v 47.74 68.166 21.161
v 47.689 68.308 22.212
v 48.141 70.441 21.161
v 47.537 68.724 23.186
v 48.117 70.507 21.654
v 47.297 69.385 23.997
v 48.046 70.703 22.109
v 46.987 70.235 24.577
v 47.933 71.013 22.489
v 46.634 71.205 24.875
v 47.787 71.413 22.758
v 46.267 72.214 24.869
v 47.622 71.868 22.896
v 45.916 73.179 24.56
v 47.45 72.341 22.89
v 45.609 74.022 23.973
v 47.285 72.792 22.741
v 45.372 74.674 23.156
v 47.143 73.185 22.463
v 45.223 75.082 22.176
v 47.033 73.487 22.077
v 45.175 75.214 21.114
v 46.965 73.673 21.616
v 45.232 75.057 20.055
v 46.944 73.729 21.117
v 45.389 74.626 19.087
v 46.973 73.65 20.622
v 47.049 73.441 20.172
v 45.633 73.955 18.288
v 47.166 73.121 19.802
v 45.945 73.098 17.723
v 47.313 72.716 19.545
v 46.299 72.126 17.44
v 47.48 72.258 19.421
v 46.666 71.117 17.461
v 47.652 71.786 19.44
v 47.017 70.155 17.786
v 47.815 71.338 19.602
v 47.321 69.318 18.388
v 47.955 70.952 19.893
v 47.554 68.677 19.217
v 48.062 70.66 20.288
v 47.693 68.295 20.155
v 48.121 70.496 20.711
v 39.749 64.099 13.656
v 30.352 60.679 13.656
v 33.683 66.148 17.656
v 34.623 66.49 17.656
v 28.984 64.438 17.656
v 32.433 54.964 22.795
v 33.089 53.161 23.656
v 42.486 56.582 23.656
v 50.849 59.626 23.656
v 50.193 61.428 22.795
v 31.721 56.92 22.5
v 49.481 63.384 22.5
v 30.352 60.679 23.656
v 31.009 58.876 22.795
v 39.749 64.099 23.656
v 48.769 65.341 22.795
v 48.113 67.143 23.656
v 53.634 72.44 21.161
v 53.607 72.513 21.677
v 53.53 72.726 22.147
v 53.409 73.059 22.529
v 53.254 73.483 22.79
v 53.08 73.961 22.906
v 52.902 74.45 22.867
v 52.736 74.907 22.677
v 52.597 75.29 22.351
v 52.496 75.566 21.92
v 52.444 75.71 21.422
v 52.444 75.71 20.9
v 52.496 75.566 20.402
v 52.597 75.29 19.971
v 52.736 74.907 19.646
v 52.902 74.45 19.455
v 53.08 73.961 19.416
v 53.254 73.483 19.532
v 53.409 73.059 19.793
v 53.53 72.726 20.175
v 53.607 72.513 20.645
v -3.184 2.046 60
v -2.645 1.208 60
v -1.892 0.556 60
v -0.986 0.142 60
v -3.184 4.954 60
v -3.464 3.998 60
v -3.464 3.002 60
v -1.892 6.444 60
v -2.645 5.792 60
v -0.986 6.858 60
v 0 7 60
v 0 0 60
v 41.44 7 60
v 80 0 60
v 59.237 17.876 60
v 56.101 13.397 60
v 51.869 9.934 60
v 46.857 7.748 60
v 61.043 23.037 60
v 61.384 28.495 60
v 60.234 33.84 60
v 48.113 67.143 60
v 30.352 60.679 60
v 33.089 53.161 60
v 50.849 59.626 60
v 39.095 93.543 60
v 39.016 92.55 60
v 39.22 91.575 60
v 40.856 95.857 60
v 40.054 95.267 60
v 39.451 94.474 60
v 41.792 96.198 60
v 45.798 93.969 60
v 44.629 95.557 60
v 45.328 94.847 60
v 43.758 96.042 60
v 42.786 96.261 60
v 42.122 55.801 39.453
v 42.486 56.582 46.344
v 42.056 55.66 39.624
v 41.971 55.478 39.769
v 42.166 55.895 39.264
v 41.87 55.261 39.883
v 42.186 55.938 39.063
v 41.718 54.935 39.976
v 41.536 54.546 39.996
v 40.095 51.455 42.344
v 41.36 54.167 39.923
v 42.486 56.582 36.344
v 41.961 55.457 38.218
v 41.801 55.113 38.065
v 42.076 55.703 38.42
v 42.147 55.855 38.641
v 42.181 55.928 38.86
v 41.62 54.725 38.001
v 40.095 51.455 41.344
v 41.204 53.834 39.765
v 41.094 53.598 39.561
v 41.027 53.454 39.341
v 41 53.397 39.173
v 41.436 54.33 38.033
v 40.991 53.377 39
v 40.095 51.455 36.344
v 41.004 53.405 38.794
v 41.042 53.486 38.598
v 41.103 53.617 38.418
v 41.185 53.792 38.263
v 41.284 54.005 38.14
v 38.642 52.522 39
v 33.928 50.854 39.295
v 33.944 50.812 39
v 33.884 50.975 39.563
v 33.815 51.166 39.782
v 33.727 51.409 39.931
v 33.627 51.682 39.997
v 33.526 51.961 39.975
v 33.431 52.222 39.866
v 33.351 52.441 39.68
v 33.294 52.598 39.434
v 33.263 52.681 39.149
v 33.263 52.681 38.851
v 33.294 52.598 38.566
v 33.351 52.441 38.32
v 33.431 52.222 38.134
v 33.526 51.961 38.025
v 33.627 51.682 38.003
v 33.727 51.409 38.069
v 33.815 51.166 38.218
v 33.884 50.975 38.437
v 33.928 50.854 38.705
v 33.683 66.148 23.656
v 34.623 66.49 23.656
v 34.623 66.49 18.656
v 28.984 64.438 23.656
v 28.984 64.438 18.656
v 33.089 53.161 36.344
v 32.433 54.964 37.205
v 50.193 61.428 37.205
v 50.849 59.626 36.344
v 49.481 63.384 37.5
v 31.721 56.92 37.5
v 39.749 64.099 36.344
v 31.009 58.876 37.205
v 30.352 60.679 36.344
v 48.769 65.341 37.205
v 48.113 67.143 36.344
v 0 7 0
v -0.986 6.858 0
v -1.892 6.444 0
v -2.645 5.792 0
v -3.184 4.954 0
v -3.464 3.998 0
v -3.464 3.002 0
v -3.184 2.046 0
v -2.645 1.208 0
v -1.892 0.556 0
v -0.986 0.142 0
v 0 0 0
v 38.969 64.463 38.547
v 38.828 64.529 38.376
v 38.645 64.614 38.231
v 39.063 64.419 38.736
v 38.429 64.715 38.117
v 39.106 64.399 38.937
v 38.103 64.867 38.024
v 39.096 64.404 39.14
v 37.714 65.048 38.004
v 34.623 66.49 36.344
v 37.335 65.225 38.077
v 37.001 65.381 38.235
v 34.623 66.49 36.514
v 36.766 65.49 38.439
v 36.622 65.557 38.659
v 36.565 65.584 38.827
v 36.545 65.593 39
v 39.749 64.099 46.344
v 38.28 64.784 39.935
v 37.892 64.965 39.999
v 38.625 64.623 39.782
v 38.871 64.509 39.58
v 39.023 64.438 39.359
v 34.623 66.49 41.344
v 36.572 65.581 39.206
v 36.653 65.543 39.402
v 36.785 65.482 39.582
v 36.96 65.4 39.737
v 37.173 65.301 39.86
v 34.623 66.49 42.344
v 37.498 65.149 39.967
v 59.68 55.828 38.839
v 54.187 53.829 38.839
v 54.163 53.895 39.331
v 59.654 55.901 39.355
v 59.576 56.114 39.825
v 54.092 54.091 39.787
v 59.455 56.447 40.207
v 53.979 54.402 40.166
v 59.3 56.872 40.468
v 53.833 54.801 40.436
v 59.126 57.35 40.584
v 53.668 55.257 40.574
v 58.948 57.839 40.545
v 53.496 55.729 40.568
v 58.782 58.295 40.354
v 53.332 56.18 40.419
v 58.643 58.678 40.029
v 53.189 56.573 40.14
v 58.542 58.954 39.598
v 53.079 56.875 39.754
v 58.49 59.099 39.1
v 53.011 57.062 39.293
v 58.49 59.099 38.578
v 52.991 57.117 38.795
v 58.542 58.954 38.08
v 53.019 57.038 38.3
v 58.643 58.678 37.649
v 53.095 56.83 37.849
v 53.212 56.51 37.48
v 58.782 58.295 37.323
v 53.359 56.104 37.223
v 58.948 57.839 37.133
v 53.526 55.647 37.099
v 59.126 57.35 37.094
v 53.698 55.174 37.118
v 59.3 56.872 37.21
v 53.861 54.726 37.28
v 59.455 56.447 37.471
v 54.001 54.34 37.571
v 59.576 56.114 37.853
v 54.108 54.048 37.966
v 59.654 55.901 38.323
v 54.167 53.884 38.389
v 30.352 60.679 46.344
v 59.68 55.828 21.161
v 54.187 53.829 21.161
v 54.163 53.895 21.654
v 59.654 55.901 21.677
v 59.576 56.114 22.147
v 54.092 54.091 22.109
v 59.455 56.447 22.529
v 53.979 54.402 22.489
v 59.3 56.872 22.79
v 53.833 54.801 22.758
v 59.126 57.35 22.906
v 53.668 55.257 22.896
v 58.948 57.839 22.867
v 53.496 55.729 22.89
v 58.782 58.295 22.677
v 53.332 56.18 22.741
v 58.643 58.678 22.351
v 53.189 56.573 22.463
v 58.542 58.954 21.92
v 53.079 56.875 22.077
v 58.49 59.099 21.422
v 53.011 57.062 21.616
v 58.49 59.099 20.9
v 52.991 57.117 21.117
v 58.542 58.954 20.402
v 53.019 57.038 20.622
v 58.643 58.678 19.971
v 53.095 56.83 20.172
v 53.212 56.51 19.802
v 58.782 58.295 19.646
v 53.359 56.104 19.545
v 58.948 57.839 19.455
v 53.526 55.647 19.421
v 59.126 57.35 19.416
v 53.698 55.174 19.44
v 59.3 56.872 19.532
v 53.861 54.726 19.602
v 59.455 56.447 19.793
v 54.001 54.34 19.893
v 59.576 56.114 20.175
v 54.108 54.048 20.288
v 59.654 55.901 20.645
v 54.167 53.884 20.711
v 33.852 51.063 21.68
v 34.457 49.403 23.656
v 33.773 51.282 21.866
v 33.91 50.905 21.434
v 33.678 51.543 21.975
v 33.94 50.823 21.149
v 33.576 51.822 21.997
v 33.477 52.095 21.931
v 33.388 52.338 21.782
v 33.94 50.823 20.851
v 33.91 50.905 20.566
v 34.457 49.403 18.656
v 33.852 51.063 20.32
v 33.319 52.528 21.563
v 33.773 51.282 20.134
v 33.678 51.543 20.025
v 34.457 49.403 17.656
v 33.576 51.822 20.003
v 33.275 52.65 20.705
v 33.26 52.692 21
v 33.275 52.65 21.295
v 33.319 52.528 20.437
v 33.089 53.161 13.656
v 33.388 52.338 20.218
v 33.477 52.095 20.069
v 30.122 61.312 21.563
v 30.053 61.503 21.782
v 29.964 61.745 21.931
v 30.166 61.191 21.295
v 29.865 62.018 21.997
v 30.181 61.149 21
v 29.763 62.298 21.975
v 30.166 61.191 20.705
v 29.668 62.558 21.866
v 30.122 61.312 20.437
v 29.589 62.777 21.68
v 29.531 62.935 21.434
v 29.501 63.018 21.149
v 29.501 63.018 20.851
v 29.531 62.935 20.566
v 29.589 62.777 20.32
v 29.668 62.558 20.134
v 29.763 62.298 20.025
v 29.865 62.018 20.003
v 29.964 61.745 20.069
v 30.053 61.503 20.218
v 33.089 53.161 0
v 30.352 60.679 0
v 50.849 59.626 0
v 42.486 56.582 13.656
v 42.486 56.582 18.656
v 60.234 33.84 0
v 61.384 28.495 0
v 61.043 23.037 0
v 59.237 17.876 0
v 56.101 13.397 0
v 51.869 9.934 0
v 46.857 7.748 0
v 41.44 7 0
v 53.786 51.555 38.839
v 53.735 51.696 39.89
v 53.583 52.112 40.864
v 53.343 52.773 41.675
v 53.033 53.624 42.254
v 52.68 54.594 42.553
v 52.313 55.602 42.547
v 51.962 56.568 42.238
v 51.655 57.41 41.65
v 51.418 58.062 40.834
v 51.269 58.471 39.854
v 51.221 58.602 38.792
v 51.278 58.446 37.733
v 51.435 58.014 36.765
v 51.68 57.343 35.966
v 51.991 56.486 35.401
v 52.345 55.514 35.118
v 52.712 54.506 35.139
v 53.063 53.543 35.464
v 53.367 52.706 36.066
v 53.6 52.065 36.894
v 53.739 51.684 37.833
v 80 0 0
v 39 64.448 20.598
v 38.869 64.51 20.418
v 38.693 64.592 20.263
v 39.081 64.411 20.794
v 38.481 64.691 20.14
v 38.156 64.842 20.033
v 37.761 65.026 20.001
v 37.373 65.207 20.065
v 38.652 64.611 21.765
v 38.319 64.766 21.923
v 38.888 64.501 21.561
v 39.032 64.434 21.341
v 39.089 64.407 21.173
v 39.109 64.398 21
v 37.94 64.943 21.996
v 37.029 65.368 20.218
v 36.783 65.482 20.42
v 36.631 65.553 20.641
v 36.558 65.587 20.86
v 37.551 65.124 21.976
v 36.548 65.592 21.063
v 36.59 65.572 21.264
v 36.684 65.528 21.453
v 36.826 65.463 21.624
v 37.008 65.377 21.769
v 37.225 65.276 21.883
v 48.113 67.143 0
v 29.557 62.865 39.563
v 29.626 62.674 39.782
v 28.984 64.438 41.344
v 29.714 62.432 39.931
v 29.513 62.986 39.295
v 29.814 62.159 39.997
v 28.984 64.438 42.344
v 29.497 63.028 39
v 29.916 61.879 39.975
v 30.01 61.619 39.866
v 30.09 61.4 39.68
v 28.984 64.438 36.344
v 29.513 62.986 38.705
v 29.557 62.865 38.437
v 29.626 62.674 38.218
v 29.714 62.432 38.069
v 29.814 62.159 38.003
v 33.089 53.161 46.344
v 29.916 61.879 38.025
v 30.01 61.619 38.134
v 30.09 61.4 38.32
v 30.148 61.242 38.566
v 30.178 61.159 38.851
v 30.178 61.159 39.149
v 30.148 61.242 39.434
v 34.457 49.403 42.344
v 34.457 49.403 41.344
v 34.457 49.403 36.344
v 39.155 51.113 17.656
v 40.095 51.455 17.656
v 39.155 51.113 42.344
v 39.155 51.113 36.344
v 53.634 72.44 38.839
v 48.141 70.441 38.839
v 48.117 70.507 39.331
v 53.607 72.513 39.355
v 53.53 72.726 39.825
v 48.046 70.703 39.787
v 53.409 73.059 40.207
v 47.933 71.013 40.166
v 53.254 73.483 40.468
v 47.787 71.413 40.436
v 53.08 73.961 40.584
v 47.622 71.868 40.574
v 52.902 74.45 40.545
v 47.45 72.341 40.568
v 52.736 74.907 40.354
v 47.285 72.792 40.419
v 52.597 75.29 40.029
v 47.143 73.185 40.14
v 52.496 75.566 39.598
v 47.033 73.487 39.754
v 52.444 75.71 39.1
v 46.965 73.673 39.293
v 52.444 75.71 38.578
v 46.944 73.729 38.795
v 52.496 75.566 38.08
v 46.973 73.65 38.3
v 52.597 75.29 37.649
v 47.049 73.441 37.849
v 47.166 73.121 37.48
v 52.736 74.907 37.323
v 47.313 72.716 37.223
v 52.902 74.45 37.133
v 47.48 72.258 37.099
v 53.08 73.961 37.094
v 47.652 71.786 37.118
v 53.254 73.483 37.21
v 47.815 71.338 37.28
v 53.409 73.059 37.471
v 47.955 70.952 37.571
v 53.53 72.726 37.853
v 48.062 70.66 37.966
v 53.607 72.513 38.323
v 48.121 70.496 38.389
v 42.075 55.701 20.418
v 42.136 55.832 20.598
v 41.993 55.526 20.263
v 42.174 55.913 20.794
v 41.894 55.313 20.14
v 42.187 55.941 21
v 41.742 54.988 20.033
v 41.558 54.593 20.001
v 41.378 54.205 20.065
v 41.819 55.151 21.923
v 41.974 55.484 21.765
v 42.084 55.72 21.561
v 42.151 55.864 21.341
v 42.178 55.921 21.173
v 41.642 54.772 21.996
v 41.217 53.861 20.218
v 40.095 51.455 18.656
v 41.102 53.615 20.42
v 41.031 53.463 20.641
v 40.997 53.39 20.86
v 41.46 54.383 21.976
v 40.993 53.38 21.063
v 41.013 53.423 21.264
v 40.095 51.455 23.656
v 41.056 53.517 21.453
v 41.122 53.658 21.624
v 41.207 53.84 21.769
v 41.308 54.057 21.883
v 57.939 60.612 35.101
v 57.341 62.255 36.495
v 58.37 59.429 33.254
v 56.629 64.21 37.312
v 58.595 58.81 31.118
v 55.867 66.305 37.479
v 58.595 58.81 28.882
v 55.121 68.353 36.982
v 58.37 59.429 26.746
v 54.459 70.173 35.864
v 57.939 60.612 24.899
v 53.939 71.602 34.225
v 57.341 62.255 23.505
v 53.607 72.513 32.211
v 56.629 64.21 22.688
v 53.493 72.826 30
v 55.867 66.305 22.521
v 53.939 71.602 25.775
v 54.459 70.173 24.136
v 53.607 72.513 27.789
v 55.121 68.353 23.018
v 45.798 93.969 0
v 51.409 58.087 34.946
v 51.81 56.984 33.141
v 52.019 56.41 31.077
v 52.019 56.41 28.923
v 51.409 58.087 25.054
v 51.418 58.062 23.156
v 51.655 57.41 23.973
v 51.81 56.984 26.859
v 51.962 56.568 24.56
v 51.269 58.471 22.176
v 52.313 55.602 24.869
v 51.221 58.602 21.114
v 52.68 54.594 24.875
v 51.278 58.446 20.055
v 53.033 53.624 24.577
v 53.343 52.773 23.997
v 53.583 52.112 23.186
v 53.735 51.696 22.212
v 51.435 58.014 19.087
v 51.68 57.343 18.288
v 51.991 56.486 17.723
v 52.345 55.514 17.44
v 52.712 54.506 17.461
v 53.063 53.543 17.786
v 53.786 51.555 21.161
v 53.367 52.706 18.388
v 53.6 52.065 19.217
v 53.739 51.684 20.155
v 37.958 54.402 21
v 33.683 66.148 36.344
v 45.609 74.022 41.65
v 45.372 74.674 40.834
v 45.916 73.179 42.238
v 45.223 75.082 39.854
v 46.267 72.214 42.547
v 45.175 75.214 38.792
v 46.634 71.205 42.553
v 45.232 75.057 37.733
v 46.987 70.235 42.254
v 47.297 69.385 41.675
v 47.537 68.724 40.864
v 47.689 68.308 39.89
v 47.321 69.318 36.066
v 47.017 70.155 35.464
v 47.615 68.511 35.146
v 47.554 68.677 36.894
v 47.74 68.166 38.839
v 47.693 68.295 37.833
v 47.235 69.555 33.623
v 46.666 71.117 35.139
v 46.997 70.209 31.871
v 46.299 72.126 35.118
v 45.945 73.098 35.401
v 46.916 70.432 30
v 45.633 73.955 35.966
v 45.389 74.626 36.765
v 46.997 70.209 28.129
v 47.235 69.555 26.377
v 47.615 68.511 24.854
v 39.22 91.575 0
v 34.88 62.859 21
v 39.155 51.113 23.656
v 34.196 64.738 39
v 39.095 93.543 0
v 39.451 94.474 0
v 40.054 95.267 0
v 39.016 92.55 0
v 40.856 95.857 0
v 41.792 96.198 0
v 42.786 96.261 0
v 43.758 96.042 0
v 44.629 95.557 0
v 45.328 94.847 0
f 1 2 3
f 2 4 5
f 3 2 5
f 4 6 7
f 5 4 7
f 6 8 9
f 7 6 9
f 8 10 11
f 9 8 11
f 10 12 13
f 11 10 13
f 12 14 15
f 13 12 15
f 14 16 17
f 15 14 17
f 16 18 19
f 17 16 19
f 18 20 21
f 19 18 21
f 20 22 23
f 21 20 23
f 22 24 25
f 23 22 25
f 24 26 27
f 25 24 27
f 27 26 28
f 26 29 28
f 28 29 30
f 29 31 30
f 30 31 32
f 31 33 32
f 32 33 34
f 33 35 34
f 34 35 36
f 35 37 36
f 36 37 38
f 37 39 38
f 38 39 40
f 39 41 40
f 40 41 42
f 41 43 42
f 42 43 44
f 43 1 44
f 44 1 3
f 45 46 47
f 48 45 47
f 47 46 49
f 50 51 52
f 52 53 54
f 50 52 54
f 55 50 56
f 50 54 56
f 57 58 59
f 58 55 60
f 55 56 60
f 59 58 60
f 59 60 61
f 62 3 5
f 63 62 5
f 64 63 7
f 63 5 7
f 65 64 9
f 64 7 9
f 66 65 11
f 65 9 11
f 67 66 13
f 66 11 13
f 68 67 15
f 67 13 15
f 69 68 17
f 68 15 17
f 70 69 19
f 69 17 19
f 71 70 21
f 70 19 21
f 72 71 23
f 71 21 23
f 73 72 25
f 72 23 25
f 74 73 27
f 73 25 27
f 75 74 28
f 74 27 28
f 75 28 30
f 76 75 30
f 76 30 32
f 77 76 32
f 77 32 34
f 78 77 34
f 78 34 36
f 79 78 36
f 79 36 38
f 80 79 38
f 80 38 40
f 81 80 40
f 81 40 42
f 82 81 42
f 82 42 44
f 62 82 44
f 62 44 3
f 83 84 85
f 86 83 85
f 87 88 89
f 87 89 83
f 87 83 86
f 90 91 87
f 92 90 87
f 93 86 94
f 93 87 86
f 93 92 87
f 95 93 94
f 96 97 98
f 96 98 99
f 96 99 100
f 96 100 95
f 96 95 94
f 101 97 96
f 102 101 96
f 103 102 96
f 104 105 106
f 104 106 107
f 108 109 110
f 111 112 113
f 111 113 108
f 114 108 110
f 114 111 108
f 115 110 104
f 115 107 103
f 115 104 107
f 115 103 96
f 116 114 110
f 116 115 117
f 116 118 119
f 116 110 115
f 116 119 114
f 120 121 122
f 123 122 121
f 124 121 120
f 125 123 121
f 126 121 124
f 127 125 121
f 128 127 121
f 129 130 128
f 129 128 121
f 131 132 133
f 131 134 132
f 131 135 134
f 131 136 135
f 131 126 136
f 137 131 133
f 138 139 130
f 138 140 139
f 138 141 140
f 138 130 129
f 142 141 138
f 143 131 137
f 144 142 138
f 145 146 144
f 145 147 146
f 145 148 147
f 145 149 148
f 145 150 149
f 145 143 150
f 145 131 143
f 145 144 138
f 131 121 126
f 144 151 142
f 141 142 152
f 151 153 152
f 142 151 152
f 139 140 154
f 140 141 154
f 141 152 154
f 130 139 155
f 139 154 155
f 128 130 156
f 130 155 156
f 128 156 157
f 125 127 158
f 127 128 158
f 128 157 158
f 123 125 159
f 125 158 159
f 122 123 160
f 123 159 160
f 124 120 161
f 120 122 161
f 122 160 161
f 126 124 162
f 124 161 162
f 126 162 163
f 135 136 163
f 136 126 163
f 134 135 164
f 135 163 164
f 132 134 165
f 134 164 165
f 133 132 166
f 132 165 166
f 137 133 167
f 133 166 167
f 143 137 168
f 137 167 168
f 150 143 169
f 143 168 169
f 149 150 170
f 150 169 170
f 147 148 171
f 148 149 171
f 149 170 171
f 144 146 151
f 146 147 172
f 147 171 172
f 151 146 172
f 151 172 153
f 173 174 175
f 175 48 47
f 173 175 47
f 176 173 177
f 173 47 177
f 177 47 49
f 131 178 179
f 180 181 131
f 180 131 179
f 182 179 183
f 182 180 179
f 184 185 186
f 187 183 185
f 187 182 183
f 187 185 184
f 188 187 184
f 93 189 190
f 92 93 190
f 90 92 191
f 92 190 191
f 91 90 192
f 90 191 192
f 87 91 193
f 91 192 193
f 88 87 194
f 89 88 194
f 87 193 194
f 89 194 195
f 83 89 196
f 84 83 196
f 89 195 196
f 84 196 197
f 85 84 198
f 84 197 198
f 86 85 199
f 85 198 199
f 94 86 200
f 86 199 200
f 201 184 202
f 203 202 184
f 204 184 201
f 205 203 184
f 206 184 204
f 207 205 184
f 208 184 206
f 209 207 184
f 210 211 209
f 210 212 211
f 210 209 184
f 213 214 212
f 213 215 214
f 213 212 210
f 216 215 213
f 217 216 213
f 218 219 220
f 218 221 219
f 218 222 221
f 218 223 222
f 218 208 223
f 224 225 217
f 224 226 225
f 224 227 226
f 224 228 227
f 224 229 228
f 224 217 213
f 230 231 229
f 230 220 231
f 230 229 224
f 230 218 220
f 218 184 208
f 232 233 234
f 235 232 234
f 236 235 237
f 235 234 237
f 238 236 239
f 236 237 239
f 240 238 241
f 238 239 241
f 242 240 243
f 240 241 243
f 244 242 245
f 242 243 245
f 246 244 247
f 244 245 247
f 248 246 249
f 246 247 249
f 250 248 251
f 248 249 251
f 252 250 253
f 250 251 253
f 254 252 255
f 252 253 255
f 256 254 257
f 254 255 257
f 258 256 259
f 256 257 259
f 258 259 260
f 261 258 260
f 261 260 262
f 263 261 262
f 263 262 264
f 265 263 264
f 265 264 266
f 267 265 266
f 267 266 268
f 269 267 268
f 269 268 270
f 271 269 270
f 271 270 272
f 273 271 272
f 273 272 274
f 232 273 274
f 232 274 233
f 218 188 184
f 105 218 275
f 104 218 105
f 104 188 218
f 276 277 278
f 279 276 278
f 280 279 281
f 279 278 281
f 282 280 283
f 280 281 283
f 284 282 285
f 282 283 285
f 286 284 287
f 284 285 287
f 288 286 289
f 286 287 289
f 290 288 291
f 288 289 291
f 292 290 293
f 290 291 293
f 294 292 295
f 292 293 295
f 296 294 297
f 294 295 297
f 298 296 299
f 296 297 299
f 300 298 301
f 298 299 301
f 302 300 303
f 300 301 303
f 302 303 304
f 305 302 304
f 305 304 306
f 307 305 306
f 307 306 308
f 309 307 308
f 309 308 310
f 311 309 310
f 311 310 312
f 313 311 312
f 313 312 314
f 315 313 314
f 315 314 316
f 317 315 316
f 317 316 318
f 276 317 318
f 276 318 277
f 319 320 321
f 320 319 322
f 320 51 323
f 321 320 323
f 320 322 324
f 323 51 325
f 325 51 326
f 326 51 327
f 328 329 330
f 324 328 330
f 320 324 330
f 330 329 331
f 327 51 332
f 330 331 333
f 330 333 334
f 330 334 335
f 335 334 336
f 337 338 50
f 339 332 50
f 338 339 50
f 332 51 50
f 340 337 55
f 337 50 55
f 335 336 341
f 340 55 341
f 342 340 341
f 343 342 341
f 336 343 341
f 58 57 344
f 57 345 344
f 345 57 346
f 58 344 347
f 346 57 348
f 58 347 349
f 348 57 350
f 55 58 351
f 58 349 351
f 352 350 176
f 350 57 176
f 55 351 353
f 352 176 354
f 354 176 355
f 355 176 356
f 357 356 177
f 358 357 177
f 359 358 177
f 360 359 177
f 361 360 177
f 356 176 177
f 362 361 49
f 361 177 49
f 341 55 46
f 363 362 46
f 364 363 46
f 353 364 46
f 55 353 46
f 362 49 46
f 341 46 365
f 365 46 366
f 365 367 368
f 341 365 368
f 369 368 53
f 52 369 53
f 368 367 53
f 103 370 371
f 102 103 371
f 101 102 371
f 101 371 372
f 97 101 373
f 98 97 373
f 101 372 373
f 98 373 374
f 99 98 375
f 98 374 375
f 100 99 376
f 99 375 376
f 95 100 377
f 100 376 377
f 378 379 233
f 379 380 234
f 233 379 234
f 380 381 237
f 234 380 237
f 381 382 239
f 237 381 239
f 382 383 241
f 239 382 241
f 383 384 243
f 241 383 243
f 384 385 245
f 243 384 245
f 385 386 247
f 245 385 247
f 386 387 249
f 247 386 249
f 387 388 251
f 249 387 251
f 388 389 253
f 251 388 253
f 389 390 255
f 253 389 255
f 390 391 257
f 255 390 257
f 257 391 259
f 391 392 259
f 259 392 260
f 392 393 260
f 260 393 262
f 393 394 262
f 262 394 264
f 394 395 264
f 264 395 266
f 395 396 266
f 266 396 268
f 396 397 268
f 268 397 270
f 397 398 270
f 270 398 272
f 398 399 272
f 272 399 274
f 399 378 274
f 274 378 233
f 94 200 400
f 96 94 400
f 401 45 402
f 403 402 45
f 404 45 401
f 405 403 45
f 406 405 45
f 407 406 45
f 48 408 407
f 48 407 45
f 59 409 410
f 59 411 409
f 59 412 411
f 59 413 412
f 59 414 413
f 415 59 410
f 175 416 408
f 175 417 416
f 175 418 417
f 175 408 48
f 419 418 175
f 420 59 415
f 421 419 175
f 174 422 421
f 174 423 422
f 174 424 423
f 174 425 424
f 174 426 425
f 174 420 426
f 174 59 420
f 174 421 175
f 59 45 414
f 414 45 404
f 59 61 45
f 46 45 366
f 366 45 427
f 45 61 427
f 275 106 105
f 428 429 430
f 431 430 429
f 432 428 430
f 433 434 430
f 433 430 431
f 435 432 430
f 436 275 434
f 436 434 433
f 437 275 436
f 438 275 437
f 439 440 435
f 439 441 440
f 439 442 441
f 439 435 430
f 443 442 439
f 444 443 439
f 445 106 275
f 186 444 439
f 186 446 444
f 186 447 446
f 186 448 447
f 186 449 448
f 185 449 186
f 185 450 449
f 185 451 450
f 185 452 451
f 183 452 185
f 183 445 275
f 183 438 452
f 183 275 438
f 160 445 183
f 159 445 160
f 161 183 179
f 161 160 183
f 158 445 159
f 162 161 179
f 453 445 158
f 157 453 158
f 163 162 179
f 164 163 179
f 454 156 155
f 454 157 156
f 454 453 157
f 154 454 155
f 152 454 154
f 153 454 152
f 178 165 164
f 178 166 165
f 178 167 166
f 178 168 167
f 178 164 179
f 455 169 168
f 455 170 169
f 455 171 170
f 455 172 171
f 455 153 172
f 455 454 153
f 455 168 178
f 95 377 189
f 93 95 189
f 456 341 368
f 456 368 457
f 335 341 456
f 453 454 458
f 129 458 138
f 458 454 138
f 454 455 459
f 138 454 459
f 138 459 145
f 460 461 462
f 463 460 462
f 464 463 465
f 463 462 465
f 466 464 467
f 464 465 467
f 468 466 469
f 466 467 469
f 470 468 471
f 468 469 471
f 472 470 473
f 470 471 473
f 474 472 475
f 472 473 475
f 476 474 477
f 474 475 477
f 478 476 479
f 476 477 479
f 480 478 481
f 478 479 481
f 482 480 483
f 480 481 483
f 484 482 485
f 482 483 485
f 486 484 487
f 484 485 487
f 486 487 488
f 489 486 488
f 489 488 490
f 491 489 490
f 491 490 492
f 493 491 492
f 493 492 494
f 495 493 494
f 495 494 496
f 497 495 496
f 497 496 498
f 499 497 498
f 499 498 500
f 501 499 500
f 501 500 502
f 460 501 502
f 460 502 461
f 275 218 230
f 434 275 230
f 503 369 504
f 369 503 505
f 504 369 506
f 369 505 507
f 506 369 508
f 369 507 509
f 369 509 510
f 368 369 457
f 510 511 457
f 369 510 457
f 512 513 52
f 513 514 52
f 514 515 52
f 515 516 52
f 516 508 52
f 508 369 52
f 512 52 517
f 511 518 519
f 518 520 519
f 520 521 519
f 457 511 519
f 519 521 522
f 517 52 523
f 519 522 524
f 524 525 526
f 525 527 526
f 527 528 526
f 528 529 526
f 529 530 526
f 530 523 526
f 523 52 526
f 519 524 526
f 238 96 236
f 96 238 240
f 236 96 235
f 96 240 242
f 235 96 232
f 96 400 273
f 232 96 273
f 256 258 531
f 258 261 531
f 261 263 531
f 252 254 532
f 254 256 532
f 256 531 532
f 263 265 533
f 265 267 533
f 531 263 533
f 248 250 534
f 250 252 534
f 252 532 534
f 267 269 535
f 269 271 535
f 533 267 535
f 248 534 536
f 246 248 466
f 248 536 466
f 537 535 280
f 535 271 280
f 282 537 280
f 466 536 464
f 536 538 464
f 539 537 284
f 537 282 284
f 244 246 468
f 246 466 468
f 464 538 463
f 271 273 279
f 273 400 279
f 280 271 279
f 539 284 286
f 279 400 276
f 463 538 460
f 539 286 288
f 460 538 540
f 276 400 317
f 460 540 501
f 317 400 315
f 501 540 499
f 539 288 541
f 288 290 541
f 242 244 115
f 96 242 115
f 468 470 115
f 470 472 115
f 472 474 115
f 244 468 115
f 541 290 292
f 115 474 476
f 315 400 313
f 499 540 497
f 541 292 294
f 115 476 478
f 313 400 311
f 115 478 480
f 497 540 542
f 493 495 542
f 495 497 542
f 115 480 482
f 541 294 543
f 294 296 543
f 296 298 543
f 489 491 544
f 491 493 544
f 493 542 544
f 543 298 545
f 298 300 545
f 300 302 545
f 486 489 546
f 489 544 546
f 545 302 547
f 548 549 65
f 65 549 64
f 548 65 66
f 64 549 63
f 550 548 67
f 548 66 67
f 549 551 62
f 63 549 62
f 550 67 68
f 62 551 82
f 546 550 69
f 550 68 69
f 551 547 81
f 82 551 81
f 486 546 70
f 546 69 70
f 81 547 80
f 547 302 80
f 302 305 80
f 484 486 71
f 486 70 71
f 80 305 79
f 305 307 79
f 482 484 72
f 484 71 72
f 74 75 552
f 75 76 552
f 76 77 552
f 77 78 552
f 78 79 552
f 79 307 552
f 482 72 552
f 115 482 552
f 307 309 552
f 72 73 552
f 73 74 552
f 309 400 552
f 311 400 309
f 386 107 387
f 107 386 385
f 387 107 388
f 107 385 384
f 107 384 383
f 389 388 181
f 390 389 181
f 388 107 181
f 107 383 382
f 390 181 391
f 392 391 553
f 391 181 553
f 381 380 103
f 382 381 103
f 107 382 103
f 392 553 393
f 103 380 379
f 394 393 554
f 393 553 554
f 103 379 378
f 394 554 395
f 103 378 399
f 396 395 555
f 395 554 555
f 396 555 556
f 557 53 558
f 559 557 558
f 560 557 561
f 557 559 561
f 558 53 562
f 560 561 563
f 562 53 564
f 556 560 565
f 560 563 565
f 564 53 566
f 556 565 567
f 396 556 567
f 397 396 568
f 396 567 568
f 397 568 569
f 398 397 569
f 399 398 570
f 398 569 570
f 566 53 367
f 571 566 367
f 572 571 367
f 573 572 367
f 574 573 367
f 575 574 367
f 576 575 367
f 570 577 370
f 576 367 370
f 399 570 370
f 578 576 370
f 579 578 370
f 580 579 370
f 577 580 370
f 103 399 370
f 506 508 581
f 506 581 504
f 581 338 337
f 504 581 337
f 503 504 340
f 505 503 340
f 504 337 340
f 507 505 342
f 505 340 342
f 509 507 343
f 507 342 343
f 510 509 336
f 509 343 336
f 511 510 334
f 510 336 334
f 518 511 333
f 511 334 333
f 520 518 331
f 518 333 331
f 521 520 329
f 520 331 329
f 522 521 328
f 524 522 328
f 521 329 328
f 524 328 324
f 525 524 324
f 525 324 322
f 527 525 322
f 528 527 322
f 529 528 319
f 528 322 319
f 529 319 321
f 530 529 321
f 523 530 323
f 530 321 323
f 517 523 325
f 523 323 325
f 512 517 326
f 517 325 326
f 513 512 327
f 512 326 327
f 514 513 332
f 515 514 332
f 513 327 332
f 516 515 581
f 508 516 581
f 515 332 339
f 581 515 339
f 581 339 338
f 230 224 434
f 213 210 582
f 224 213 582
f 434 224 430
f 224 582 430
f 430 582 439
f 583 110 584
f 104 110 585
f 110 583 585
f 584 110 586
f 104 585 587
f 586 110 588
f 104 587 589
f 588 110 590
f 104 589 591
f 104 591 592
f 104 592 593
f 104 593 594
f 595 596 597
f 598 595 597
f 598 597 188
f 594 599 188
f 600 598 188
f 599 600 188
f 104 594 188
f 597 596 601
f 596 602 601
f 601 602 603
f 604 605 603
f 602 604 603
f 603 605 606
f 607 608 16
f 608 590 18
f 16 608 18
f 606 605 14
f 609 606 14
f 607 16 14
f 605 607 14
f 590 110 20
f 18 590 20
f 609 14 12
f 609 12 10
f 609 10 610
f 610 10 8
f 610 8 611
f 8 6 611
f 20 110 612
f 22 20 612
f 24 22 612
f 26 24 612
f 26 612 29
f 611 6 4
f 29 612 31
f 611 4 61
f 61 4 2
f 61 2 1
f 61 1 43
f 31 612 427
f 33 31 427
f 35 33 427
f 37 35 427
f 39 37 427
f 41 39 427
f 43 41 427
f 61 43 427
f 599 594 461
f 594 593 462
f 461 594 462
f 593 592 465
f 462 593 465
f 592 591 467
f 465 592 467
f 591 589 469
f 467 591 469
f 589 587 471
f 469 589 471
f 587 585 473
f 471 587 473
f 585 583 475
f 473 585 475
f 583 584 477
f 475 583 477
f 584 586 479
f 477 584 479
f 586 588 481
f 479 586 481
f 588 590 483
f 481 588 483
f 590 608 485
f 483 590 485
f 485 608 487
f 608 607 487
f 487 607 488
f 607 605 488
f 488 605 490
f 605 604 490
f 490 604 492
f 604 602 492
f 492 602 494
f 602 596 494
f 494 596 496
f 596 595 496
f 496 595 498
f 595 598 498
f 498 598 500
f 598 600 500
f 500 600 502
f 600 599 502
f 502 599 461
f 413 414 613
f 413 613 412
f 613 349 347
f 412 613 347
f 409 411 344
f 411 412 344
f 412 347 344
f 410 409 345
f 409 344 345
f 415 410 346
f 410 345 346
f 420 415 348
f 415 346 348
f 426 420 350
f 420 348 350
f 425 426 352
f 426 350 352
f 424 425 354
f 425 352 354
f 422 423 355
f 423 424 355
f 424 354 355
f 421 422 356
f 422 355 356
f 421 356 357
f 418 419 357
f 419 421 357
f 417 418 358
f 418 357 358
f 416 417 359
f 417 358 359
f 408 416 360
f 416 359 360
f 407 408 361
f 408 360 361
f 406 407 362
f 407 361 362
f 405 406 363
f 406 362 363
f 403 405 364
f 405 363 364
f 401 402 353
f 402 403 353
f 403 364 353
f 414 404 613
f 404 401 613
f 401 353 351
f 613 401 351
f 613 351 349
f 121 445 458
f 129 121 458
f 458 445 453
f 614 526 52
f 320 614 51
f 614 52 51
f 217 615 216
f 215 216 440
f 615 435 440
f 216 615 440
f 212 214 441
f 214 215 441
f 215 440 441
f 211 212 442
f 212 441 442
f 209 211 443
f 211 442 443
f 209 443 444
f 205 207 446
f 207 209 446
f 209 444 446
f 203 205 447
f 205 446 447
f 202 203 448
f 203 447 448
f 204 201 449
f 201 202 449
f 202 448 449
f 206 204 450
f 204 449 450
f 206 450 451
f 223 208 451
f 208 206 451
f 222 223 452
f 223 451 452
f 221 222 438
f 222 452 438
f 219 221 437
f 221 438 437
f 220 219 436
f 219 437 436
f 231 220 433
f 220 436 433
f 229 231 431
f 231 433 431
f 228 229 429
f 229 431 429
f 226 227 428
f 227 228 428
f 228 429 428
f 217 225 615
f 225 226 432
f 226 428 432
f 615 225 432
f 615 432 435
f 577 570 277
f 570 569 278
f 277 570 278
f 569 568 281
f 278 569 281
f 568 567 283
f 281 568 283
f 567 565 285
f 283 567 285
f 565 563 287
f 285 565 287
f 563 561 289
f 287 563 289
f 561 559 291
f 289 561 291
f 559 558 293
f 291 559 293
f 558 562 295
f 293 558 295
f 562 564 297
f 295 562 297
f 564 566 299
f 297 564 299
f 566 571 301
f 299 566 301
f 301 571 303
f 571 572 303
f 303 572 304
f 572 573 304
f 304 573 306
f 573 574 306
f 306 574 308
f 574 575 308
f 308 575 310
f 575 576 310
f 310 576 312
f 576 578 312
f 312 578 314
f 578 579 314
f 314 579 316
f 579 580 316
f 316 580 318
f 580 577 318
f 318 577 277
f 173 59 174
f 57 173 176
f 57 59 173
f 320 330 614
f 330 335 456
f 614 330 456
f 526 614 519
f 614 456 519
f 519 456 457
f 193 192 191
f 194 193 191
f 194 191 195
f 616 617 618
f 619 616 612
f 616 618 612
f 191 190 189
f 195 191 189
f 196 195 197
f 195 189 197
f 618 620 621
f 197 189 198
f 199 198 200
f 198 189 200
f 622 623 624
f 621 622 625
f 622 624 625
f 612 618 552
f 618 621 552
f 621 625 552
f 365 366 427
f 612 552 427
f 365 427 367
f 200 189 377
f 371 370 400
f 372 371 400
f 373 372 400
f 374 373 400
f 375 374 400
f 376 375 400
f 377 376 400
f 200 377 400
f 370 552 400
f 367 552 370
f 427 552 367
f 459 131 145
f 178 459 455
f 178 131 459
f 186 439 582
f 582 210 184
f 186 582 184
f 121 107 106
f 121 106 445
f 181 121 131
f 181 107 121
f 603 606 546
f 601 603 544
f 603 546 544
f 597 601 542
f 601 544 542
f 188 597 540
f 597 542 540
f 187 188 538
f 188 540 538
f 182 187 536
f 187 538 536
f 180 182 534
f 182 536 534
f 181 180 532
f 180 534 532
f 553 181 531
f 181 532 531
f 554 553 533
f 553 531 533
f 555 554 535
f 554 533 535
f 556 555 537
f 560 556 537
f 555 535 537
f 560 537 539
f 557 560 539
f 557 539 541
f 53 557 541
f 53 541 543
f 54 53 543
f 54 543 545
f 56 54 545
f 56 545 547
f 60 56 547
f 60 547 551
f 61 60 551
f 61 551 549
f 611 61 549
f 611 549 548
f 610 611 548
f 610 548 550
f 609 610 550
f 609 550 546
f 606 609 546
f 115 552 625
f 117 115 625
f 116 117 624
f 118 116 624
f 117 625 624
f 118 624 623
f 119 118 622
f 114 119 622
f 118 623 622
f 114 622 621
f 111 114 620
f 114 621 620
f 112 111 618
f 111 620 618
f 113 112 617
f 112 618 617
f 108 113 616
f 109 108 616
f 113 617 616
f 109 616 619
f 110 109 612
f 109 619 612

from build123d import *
from build123d.topology import SkipClean

# Parameters (mm, degrees)
BOSS_EXTRUDE1_DEPTH = 60
SKETCH2_R           = 7.5
CUT_EXTRUDE1_DEPTH  = 119.641534805
SKETCH3_R           = 1.75
CUT_EXTRUDE2_DEPTH  = 117.134798875
CHAMFER1_SIZE       = 2
CHAMFER1_SIZE2      = 1.154700538
BOSS_EXTRUDE2_DEPTH = 18.9
SKETCH5_W           = 5
SKETCH5_H           = 4
SKETCH5_R           = 1
BOSS_EXTRUDE3_DEPTH = 5
CHAMFER2_SIZE       = 5


with BuildPart() as part:
    # Sketch1 → Boss-Extrude1 (new body)
    with BuildSketch(Plane.XY):
        with BuildLine():
            Line((0, 0), (80, 0))
            Line((80, 0), (45.797985667, 93.969262079))
            ThreePointArc((45.797985667, 93.969262079), (41.311990993, 96.06111575), (39.220137322, 91.575121075))
            Line((39.220137322, 91.575121075), (60.233856234, 33.840402867))
            ThreePointArc((60.233856234, 33.840402867), (57.823044704, 15.528471273), (41.440003818, 7))
            Line((41.440003818, 7), (0, 7))
            ThreePointArc((0, 7), (-3.5, 3.5), (0, 0))
        make_face()
    extrude(amount=BOSS_EXTRUDE1_DEPTH)

    # Sketch2 → Cut-Extrude1 (cut, through all)
    with BuildSketch(Plane(origin=(70.641777725, 25.711504387, 0), x_dir=(0, 0, -1), z_dir=(0.9396926207859069, 0.3420201433256728, 0))):
        with Locations(Location((-30, 42.638388534, 0), (0, 0, 90))):
            Circle(SKETCH2_R)
    extrude(amount=-CUT_EXTRUDE1_DEPTH, mode=Mode.SUBTRACT)

    # Sketch3 → Cut-Extrude2 (cut, through all)
    with BuildSketch(Plane(origin=(64.063929379, 23.317363384, 0), x_dir=(0, 0, 1), z_dir=(-0.9396926207859071, -0.3420201433256726, 0))):
        with Locations(Location((21.161165235, 33.799553769, 0), (0, 0, 270))):
            Circle(SKETCH3_R)
        with Locations(Location((21.161165235, 51.477223299, 0), (0, 0, 270))):
            Circle(SKETCH3_R)
        with Locations(Location((38.838834765, 51.477223299, 0), (0, 0, 270))):
            Circle(SKETCH3_R)
        with Locations(Location((38.838834765, 33.799553769, 0), (0, 0, 270))):
            Circle(SKETCH3_R)
    extrude(amount=-CUT_EXTRUDE2_DEPTH, mode=Mode.SUBTRACT)

    # Chamfer1
    chamfer1_edges = [part.edges().sort_by_distance(p)[0] for p in [
        (45.859146838, 73.334592343, 21.161165235),
        (45.859146838, 73.334592343, 38.838834765),
        (51.905265904, 56.723016733, 38.838834765),
        (51.905265904, 56.723016733, 21.161165235),
    ]]
    chamfer1_side = [part.faces().sort_by_distance(p)[0] for p in [
        (39.513854258, 90.768140426, 30),
    ]]
    chamfer(chamfer1_edges, length=CHAMFER1_SIZE, length2=CHAMFER1_SIZE2, reference=chamfer1_side[0])

    # Sketch4 → Boss-Extrude2 (add)
    with SkipClean():  # the faces are left unmerged after this step: merging them gives an invalid solid
        with BuildSketch(Plane(origin=(64.063929379, 23.317363384, 0), x_dir=(0, 0, 1), z_dir=(-0.9396926207859071, -0.3420201433256726, 0))):
            with BuildLine():
                Line((36.34428877, 46.638388534), (60, 46.638388534))
                Line((60, 46.638388534), (60, 38.638388534))
                Line((60, 38.638388534), (36.34428877, 38.638388534))
                ThreePointArc((36.34428877, 38.638388534), (37.5, 42.638388534), (36.34428877, 46.638388534))
            make_face()
            with BuildLine():
                Line((0, 38.638388534), (23.65571123, 38.638388534))
                ThreePointArc((23.65571123, 38.638388534), (22.5, 42.638388534), (23.65571123, 46.638388534))
                Line((23.65571123, 46.638388534), (0, 46.638388534))
                Line((0, 46.638388534), (0, 38.638388534))
            make_face()
        extrude(amount=BOSS_EXTRUDE2_DEPTH)

    # Sketch5 → Boss-Extrude3 (add)
    # profile 1 of 4: a face of its own
    with SkipClean():  # the faces are left unmerged after this step: merging them gives an invalid solid
        with BuildSketch(Plane(origin=(46.303738846, 16.853182675, 0), x_dir=(0, 0, 1), z_dir=(-0.9396926207859069, -0.3420201433256728, 0))):
            with Locations((21.15571123, 48.638388534)):
                Rectangle(SKETCH5_W, SKETCH5_H)
            with Locations(Location((21, 48.138388534, 0), (0, 0, 270))):
                Circle(SKETCH5_R, mode=Mode.SUBTRACT)
        # profile 2 of 4: a face of its own
        with BuildSketch(Plane(origin=(46.303738846, 16.853182675, 0), x_dir=(0, 0, 1), z_dir=(-0.9396926207859069, -0.3420201433256728, 0))):
            with Locations((38.84428877, 48.638388534)):
                Rectangle(SKETCH5_W, SKETCH5_H)
            with Locations(Location((39, 48.138388534, 0), (0, 0, 90))):
                Circle(SKETCH5_R, mode=Mode.SUBTRACT)
        # profile 3 of 4: a face of its own
        with BuildSketch(Plane(origin=(46.303738846, 16.853182675, 0), x_dir=(0, 0, 1), z_dir=(-0.9396926207859069, -0.3420201433256728, 0))):
            with Locations((38.84428877, 36.638388534)):
                Rectangle(SKETCH5_W, SKETCH5_H)
            with Locations(Location((39, 37.138388534, 0), (0, 0, 270))):
                Circle(SKETCH5_R, mode=Mode.SUBTRACT)
        # profile 4 of 4: a face of its own
        with BuildSketch(Plane(origin=(46.303738846, 16.853182675, 0), x_dir=(0, 0, 1), z_dir=(-0.9396926207859069, -0.3420201433256728, 0))):
            with Locations((21.15571123, 36.638388534)):
                Rectangle(SKETCH5_W, SKETCH5_H)
            with Locations(Location((21, 37.138388534, 0), (0, 0, 90))):
                Circle(SKETCH5_R, mode=Mode.SUBTRACT)
        extrude(amount=-BOSS_EXTRUDE3_DEPTH)

    # Chamfer2
    # the kernel refuses this chamfer: 5 mm, written as the material it adds along each edge
    with BuildSketch(Plane(origin=(37.787094766, 54.871491976, 23.48587383), x_dir=(0.9299331952381907, 0.3677285036464934, 0), z_dir=(0, 0, 1))) as chamfer2_piece_1_section:
        Polygon((CHAMFER2_SIZE * 0.999621916911, -CHAMFER2_SIZE * 0.0274958766106), (-CHAMFER2_SIZE * 0.0274958766106, -CHAMFER2_SIZE * 0.999621916911), (0, 0), align=None)
    chamfer2_piece_1 = extrude(amount=17.85841494, mode=Mode.PRIVATE)
    chamfer2_piece_1 = chamfer2_piece_1 - Plane(origin=(38.02216053, 59.213760007, 30), x_dir=(0.18241074310702424, -0.5011693977524806, -0.8459051693633035), z_dir=(0.9396926207859071, 0.34202014332567265, 0)) * Cylinder(7.5, 56, mode=Mode.PRIVATE)
    chamfer2_piece_1 = split(chamfer2_piece_1, bisect_by=Plane(origin=(39.909169975, 54.029244166, 23.65571123), z_dir=(0, 0, -1)), keep=Keep.TOP, mode=Mode.PRIVATE)
    chamfer2_piece_1 = split(chamfer2_piece_1, bisect_by=Plane(origin=(40.758321676, 51.696219041, 23.570135946), z_dir=(-0.3420201433256728, 0.9396926207859069, 0)), keep=Keep.TOP, mode=Mode.PRIVATE)
    add(chamfer2_piece_1)
    with BuildSketch(Plane(origin=(37.787094766, 54.871491976, 36.34428877), x_dir=(0.9299331952381793, 0.3677285036465222, 0), z_dir=(0, 0, 1))) as chamfer2_piece_2_section:
        Polygon((CHAMFER2_SIZE * 0.999621916911, -CHAMFER2_SIZE * 0.0274958766106), (-CHAMFER2_SIZE * 0.0274958766106, -CHAMFER2_SIZE * 0.999621916911), (0, 0), align=None)
    chamfer2_piece_2 = extrude(amount=5, mode=Mode.PRIVATE)
    chamfer2_piece_2 = chamfer2_piece_2 - Plane(origin=(40.576659633, 60.143521644, 30), x_dir=(0.18241074310702424, -0.5011693977524806, -0.8459051693633035), z_dir=(0.9396926207859071, 0.34202014332567265, 0)) * Cylinder(7.5, 30, mode=Mode.PRIVATE)
    chamfer2_piece_2 = split(chamfer2_piece_2, bisect_by=Plane(origin=(43.312820779, 52.625980678, 40.510955437), z_dir=(-0.3420201433256728, 0.9396926207859069, 0)), keep=Keep.TOP, mode=Mode.PRIVATE)
    chamfer2_piece_2 = chamfer2_piece_2 - Plane(origin=(42.457770421, 54.97521223, 39), x_dir=(0.3420201433256728, -0.9396926207859069, 0), z_dir=(-0.9396926207859069, -0.3420201433256728, 0)) * Cylinder(1, 30, mode=Mode.PRIVATE)
    add(chamfer2_piece_2)
    with BuildSketch(Plane(origin=(33.088631662, 53.16139126, 41.34428877), x_dir=(-0.00940414365922947, 0.02583767235303998, 0.9996219169112959), z_dir=(0.9396926207859069, 0.3420201433256728, 0))) as chamfer2_piece_3_section:
        Polygon((CHAMFER2_SIZE * 0.999621916911, CHAMFER2_SIZE * 0.0274958766106), (-CHAMFER2_SIZE * 0.0274958766106, CHAMFER2_SIZE * 0.999621916911), (0, 0), align=None)
    chamfer2_piece_3 = extrude(amount=5, mode=Mode.PRIVATE)
    chamfer2_piece_3 = split(chamfer2_piece_3, bisect_by=Plane(origin=(36.805943787, 50.257671135, 43.072880832), z_dir=(-0.3420201433256728, 0.9396926207859069, 1.4210854715202e-15)), keep=Keep.TOP, mode=Mode.PRIVATE)
    add(chamfer2_piece_3)
    with BuildSketch(Plane(origin=(37.787094766, 54.871491976, 36.51412617), x_dir=(0.9299331952381907, 0.3677285036464934, 0), z_dir=(0, 0, -1))) as chamfer2_piece_4_section:
        Polygon((CHAMFER2_SIZE * 0.999621916911, CHAMFER2_SIZE * 0.0274958766106), (-CHAMFER2_SIZE * 0.0274958766106, CHAMFER2_SIZE * 0.999621916911), (0, 0), align=None)
    chamfer2_piece_4 = extrude(amount=17.85841494, mode=Mode.PRIVATE)
    chamfer2_piece_4 = chamfer2_piece_4 - Plane(origin=(38.022160531, 59.213760008, 30), x_dir=(0.18241074310702424, -0.5011693977524806, -0.8459051693633035), z_dir=(0.9396926207859071, 0.34202014332567265, 0)) * Cylinder(7.5, 56, mode=Mode.PRIVATE)
    chamfer2_piece_4 = split(chamfer2_piece_4, bisect_by=Plane(origin=(39.909169977, 54.029244164, 36.34428877), z_dir=(0, 0, 1)), keep=Keep.TOP, mode=Mode.PRIVATE)
    chamfer2_piece_4 = split(chamfer2_piece_4, bisect_by=Plane(origin=(40.758321677, 51.696219041, 36.429864054), z_dir=(-0.3420201433256728, 0.9396926207859069, 0)), keep=Keep.TOP, mode=Mode.PRIVATE)
    add(chamfer2_piece_4)
    with BuildSketch(Plane(origin=(37.787094766, 54.871491976, 23.65571123), x_dir=(0.9299331952381796, 0.36772850364652154, 0), z_dir=(0, 0, -1))) as chamfer2_piece_5_section:
        Polygon((CHAMFER2_SIZE * 0.999621916911, CHAMFER2_SIZE * 0.0274958766106), (-CHAMFER2_SIZE * 0.0274958766106, CHAMFER2_SIZE * 0.999621916911), (0, 0), align=None)
    chamfer2_piece_5 = extrude(amount=5, mode=Mode.PRIVATE)
    chamfer2_piece_5 = chamfer2_piece_5 - Plane(origin=(40.576659674, 60.143521659, 30), x_dir=(0.18241074310702424, -0.5011693977524806, -0.8459051693633035), z_dir=(0.9396926207859071, 0.34202014332567265, 0)) * Cylinder(7.5, 30, mode=Mode.PRIVATE)
    chamfer2_piece_5 = split(chamfer2_piece_5, bisect_by=Plane(origin=(43.31282082, 52.625980693, 19.489044563), z_dir=(-0.3420201433256728, 0.9396926207859069, 0)), keep=Keep.TOP, mode=Mode.PRIVATE)
    chamfer2_piece_5 = chamfer2_piece_5 - Plane(origin=(42.457770462, 54.975212245, 21), x_dir=(-0.3420201433256728, 0.9396926207859069, 0), z_dir=(-0.9396926207859069, -0.3420201433256728, 0)) * Cylinder(1, 30, mode=Mode.PRIVATE)
    add(chamfer2_piece_5)
    with BuildSketch(Plane(origin=(33.088631662, 53.16139126, 18.65571123), x_dir=(-0.009404143659228424, 0.02583767235303711, -0.9996219169112959), z_dir=(0.9396926207859069, 0.3420201433256728, 0))) as chamfer2_piece_6_section:
        Polygon((CHAMFER2_SIZE * 0.999621916911, -CHAMFER2_SIZE * 0.0274958766106), (-CHAMFER2_SIZE * 0.0274958766106, -CHAMFER2_SIZE * 0.999621916911), (0, 0), align=None)
    chamfer2_piece_6 = extrude(amount=5, mode=Mode.PRIVATE)
    chamfer2_piece_6 = split(chamfer2_piece_6, bisect_by=Plane(origin=(36.805943787, 50.257671135, 16.927119168), z_dir=(-0.3420201433256728, 0.9396926207859069, 0)), keep=Keep.TOP, mode=Mode.PRIVATE)
    add(chamfer2_piece_6)
    with BuildSketch(Plane(origin=(30.352470516, 60.678932226, 18.65571123), x_dir=(0.009404143659218054, -0.025837672353008618, -0.9996219169112968), z_dir=(0.9396926207859069, 0.3420201433256728, 0))) as chamfer2_piece_7_section:
        Polygon((CHAMFER2_SIZE * 0.999621916911, CHAMFER2_SIZE * 0.0274958766106), (-CHAMFER2_SIZE * 0.0274958766106, CHAMFER2_SIZE * 0.999621916911), (0, 0), align=None)
    chamfer2_piece_7 = extrude(amount=5, mode=Mode.PRIVATE)
    chamfer2_piece_7 = split(chamfer2_piece_7, bisect_by=Plane(origin=(31.333621494, 65.292753067, 16.927119168), z_dir=(0.3420201433256728, -0.9396926207859069, 0)), keep=Keep.TOP, mode=Mode.PRIVATE)
    add(chamfer2_piece_7)
    with BuildSketch(Plane(origin=(35.050933619, 62.389032943, 36.51412617), x_dir=(0.9487414825566265, 0.3160531589404771, 0), z_dir=(0, 0, -1))) as chamfer2_piece_8_section:
        Polygon((CHAMFER2_SIZE * 0.999621916911, -CHAMFER2_SIZE * 0.0274958766106), (-CHAMFER2_SIZE * 0.0274958766106, -CHAMFER2_SIZE * 0.999621916911), (0, 0), align=None)
    chamfer2_piece_8 = extrude(amount=17.85841494, mode=Mode.PRIVATE)
    chamfer2_piece_8 = chamfer2_piece_8 - Plane(origin=(38.02216053, 59.213760007, 30), x_dir=(0.18241074310702424, -0.5011693977524806, -0.8459051693633035), z_dir=(0.9396926207859071, 0.34202014332567265, 0)) * Cylinder(7.5, 56, mode=Mode.PRIVATE)
    chamfer2_piece_8 = split(chamfer2_piece_8, bisect_by=Plane(origin=(35.285999383, 66.731300974, 36.429864054), z_dir=(0.3420201433256728, -0.9396926207859069, 0)), keep=Keep.TOP, mode=Mode.PRIVATE)
    chamfer2_piece_8 = split(chamfer2_piece_8, bisect_by=Plane(origin=(36.135151084, 64.398275849, 36.34428877), z_dir=(0, 0, 1)), keep=Keep.TOP, mode=Mode.PRIVATE)
    add(chamfer2_piece_8)
    with BuildSketch(Plane(origin=(35.050933619, 62.389032943, 23.65571123), x_dir=(0.9487414825566265, 0.3160531589404771, 0), z_dir=(0, 0, -1))) as chamfer2_piece_9_section:
        Polygon((CHAMFER2_SIZE * 0.999621916911, -CHAMFER2_SIZE * 0.0274958766106), (-CHAMFER2_SIZE * 0.0274958766106, -CHAMFER2_SIZE * 0.999621916911), (0, 0), align=None)
    chamfer2_piece_9 = extrude(amount=5, mode=Mode.PRIVATE)
    chamfer2_piece_9 = chamfer2_piece_9 - Plane(origin=(40.576659674, 60.143521659, 30), x_dir=(0.18241074310702424, -0.5011693977524806, -0.8459051693633035), z_dir=(0.9396926207859071, 0.34202014332567265, 0)) * Cylinder(7.5, 30, mode=Mode.PRIVATE)
    chamfer2_piece_9 = split(chamfer2_piece_9, bisect_by=Plane(origin=(37.840498527, 67.661062625, 19.489044563), z_dir=(0.3420201433256728, -0.9396926207859069, 0)), keep=Keep.TOP, mode=Mode.PRIVATE)
    chamfer2_piece_9 = chamfer2_piece_9 - Plane(origin=(38.695548885, 65.311831073, 21), x_dir=(0.3420201433256728, -0.9396926207859069, 0), z_dir=(-0.9396926207859069, -0.3420201433256728, 0)) * Cylinder(1, 30, mode=Mode.PRIVATE)
    add(chamfer2_piece_9)
    with BuildSketch(Plane(origin=(35.050933619, 62.389032943, 41.34428877), x_dir=(0.9487414825566282, 0.3160531589404717, 0), z_dir=(0, 0, -1))) as chamfer2_piece_10_section:
        Polygon((CHAMFER2_SIZE * 0.999621916911, -CHAMFER2_SIZE * 0.0274958766106), (-CHAMFER2_SIZE * 0.0274958766106, -CHAMFER2_SIZE * 0.999621916911), (0, 0), align=None)
    chamfer2_piece_10 = extrude(amount=5, mode=Mode.PRIVATE)
    chamfer2_piece_10 = chamfer2_piece_10 - Plane(origin=(40.576659633, 60.143521644, 30), x_dir=(0.18241074310702424, -0.5011693977524806, -0.8459051693633035), z_dir=(0.9396926207859071, 0.34202014332567265, 0)) * Cylinder(7.5, 30, mode=Mode.PRIVATE)
    chamfer2_piece_10 = split(chamfer2_piece_10, bisect_by=Plane(origin=(37.840498486, 67.661062611, 37.177622104), z_dir=(0.3420201433256728, -0.9396926207859069, 0)), keep=Keep.TOP, mode=Mode.PRIVATE)
    chamfer2_piece_10 = chamfer2_piece_10 - Plane(origin=(38.695548844, 65.311831059, 39), x_dir=(-0.3420201433256728, 0.9396926207859069, 0), z_dir=(-0.9396926207859069, -0.3420201433256728, 0)) * Cylinder(1, 30, mode=Mode.PRIVATE)
    add(chamfer2_piece_10)
    with BuildSketch(Plane(origin=(35.050933619, 62.389032943, 41.34428877), x_dir=(0.9487414825566282, 0.3160531589404717, 0), z_dir=(0, 0, -1))) as chamfer2_piece_11_section:
        Polygon((CHAMFER2_SIZE * 0.999621916911, -CHAMFER2_SIZE * 0.0274958766106), (-CHAMFER2_SIZE * 0.0274958766106, -CHAMFER2_SIZE * 0.999621916911), (0, 0), align=None)
    chamfer2_piece_11 = extrude(amount=17.85841494, mode=Mode.PRIVATE)
    chamfer2_piece_11 = chamfer2_piece_11 - Plane(origin=(38.022160531, 59.213760008, 30), x_dir=(0.18241074310702424, -0.5011693977524806, -0.8459051693633035), z_dir=(0.9396926207859071, 0.34202014332567265, 0)) * Cylinder(7.5, 56, mode=Mode.PRIVATE)
    chamfer2_piece_11 = split(chamfer2_piece_11, bisect_by=Plane(origin=(35.285999384, 66.731300974, 23.570135946), z_dir=(0.3420201433256728, -0.9396926207859069, 0)), keep=Keep.TOP, mode=Mode.PRIVATE)
    chamfer2_piece_11 = split(chamfer2_piece_11, bisect_by=Plane(origin=(36.135151085, 64.398275851, 23.65571123), z_dir=(0, 0, -1)), keep=Keep.TOP, mode=Mode.PRIVATE)
    add(chamfer2_piece_11)
    with BuildSketch(Plane(origin=(30.352470516, 60.678932226, 41.34428877), x_dir=(0.009404143659219547, -0.025837672353012715, 0.9996219169112965), z_dir=(0.9396926207859069, 0.3420201433256728, 0))) as chamfer2_piece_12_section:
        Polygon((CHAMFER2_SIZE * 0.999621916911, -CHAMFER2_SIZE * 0.0274958766106), (-CHAMFER2_SIZE * 0.0274958766106, -CHAMFER2_SIZE * 0.999621916911), (0, 0), align=None)
    chamfer2_piece_12 = extrude(amount=5, mode=Mode.PRIVATE)
    chamfer2_piece_12 = split(chamfer2_piece_12, bisect_by=Plane(origin=(31.333621494, 65.292753067, 43.072880832), z_dir=(0.3420201433256728, -0.9396926207859069, 1.4210854715202e-15)), keep=Keep.TOP, mode=Mode.PRIVATE)
    add(chamfer2_piece_12)
    with BuildSketch(Plane(origin=(37.787094766, 54.871491976, 36.34428877), x_dir=(0.9299331952381793, 0.3677285036465222, 0), z_dir=(0, 0, 1))) as chamfer2_piece_13a_section:
        Polygon((CHAMFER2_SIZE * 0.999621916911, -CHAMFER2_SIZE * 0.0274958766106), (-CHAMFER2_SIZE * 0.0274958766106, -CHAMFER2_SIZE * 0.999621916911), (0, 0), align=None)
    chamfer2_piece_13a = extrude(amount=17.85841494, mode=Mode.PRIVATE)
    chamfer2_piece_13a = split(chamfer2_piece_13a, bisect_by=Plane(origin=(40.779520544, 51.703934798, 47.77349624), z_dir=(-0.3420201433256728, 0.9396926207859069, 0)), keep=Keep.TOP, mode=Mode.PRIVATE)
    chamfer2_piece_13a = split(chamfer2_piece_13a, bisect_by=Plane(origin=(39.923484947, 54.05587327, 41.34428877), z_dir=(0, 0, 1)), keep=Keep.TOP, mode=Mode.PRIVATE)
    with BuildSketch(Plane(origin=(33.088631662, 53.16139126, 41.34428877), x_dir=(-0.00940414365922947, 0.02583767235303998, 0.9996219169112959), z_dir=(0.9396926207859069, 0.3420201433256728, 0))) as chamfer2_piece_13b_section:
        Polygon((CHAMFER2_SIZE * 0.999621916911, CHAMFER2_SIZE * 0.0274958766106), (-CHAMFER2_SIZE * 0.0274958766106, CHAMFER2_SIZE * 0.999621916911), (0, 0), align=None)
    chamfer2_piece_13b = extrude(amount=17.85841494, mode=Mode.PRIVATE)
    chamfer2_piece_13b = split(chamfer2_piece_13b, bisect_by=Plane(origin=(38.299139743, 53.464659965, 43.072880832), z_dir=(0.9396926207859069, 0.3420201433256728, 0)), keep=Keep.TOP, mode=Mode.PRIVATE)
    chamfer2_piece_13b = split(chamfer2_piece_13b, bisect_by=Plane(origin=(45.196654156, 53.311639954, 43.072880832), z_dir=(-0.3420201433256728, 0.9396926207859069, 1.4210854715202e-15)), keep=Keep.TOP, mode=Mode.PRIVATE)
    chamfer2_piece_13 = chamfer2_piece_13a & chamfer2_piece_13b
    add(chamfer2_piece_13)
    with BuildSketch(Plane(origin=(37.787094766, 54.871491976, 23.65571123), x_dir=(0.9299331952381796, 0.36772850364652154, 0), z_dir=(0, 0, -1))) as chamfer2_piece_14a_section:
        Polygon((CHAMFER2_SIZE * 0.999621916911, CHAMFER2_SIZE * 0.0274958766106), (-CHAMFER2_SIZE * 0.0274958766106, CHAMFER2_SIZE * 0.999621916911), (0, 0), align=None)
    chamfer2_piece_14a = extrude(amount=17.85841494, mode=Mode.PRIVATE)
    chamfer2_piece_14a = split(chamfer2_piece_14a, bisect_by=Plane(origin=(39.923484947, 54.05587327, 18.65571123), z_dir=(0, 0, -1)), keep=Keep.TOP, mode=Mode.PRIVATE)
    chamfer2_piece_14a = split(chamfer2_piece_14a, bisect_by=Plane(origin=(40.779520544, 51.703934798, 12.22650376), z_dir=(-0.3420201433256728, 0.9396926207859069, 0)), keep=Keep.TOP, mode=Mode.PRIVATE)
    with BuildSketch(Plane(origin=(33.088631662, 53.16139126, 18.65571123), x_dir=(-0.009404143659228424, 0.02583767235303711, -0.9996219169112959), z_dir=(0.9396926207859069, 0.3420201433256728, 0))) as chamfer2_piece_14b_section:
        Polygon((CHAMFER2_SIZE * 0.999621916911, -CHAMFER2_SIZE * 0.0274958766106), (-CHAMFER2_SIZE * 0.0274958766106, -CHAMFER2_SIZE * 0.999621916911), (0, 0), align=None)
    chamfer2_piece_14b = extrude(amount=17.85841494, mode=Mode.PRIVATE)
    chamfer2_piece_14b = split(chamfer2_piece_14b, bisect_by=Plane(origin=(38.299139743, 53.464659965, 16.927119168), z_dir=(0.9396926207859069, 0.3420201433256728, 0)), keep=Keep.TOP, mode=Mode.PRIVATE)
    chamfer2_piece_14b = split(chamfer2_piece_14b, bisect_by=Plane(origin=(45.196654156, 53.311639954, 16.927119168), z_dir=(-0.3420201433256728, 0.9396926207859069, 0)), keep=Keep.TOP, mode=Mode.PRIVATE)
    chamfer2_piece_14 = chamfer2_piece_14a & chamfer2_piece_14b
    add(chamfer2_piece_14)
    with BuildSketch(Plane(origin=(30.352470516, 60.678932226, 18.65571123), x_dir=(0.009404143659218054, -0.025837672353008618, -0.9996219169112968), z_dir=(0.9396926207859069, 0.3420201433256728, 0))) as chamfer2_piece_15a_section:
        Polygon((CHAMFER2_SIZE * 0.999621916911, CHAMFER2_SIZE * 0.0274958766106), (-CHAMFER2_SIZE * 0.0274958766106, CHAMFER2_SIZE * 0.999621916911), (0, 0), align=None)
    chamfer2_piece_15a = extrude(amount=17.85841494, mode=Mode.PRIVATE)
    chamfer2_piece_15a = split(chamfer2_piece_15a, bisect_by=Plane(origin=(39.724331863, 68.346721886, 16.927119168), z_dir=(0.3420201433256728, -0.9396926207859069, 0)), keep=Keep.TOP, mode=Mode.PRIVATE)
    chamfer2_piece_15a = split(chamfer2_piece_15a, bisect_by=Plane(origin=(34.538888643, 63.795864954, 16.927119168), z_dir=(0.9396926207859069, 0.3420201433256728, 0)), keep=Keep.TOP, mode=Mode.PRIVATE)
    with BuildSketch(Plane(origin=(35.050933619, 62.389032943, 23.65571123), x_dir=(0.9487414825566265, 0.3160531589404771, 0), z_dir=(0, 0, -1))) as chamfer2_piece_15b_section:
        Polygon((CHAMFER2_SIZE * 0.999621916911, -CHAMFER2_SIZE * 0.0274958766106), (-CHAMFER2_SIZE * 0.0274958766106, -CHAMFER2_SIZE * 0.999621916911), (0, 0), align=None)
    chamfer2_piece_15b = extrude(amount=17.85841494, mode=Mode.PRIVATE)
    chamfer2_piece_15b = split(chamfer2_piece_15b, bisect_by=Plane(origin=(36.163233847, 64.387078259, 18.65571123), z_dir=(0, 0, -1)), keep=Keep.TOP, mode=Mode.PRIVATE)
    chamfer2_piece_15b = split(chamfer2_piece_15b, bisect_by=Plane(origin=(35.307198251, 66.73901673, 12.22650376), z_dir=(0.3420201433256728, -0.9396926207859069, 0)), keep=Keep.TOP, mode=Mode.PRIVATE)
    chamfer2_piece_15 = chamfer2_piece_15a & chamfer2_piece_15b
    add(chamfer2_piece_15)
    with BuildSketch(Plane(origin=(30.352470516, 60.678932226, 41.34428877), x_dir=(0.009404143659219547, -0.025837672353012715, 0.9996219169112965), z_dir=(0.9396926207859069, 0.3420201433256728, 0))) as chamfer2_piece_16a_section:
        Polygon((CHAMFER2_SIZE * 0.999621916911, -CHAMFER2_SIZE * 0.0274958766106), (-CHAMFER2_SIZE * 0.0274958766106, -CHAMFER2_SIZE * 0.999621916911), (0, 0), align=None)
    chamfer2_piece_16a = extrude(amount=17.85841494, mode=Mode.PRIVATE)
    chamfer2_piece_16a = split(chamfer2_piece_16a, bisect_by=Plane(origin=(39.724331863, 68.346721886, 43.072880832), z_dir=(0.3420201433256728, -0.9396926207859069, 1.4210854715202e-15)), keep=Keep.TOP, mode=Mode.PRIVATE)
    chamfer2_piece_16a = split(chamfer2_piece_16a, bisect_by=Plane(origin=(34.538888643, 63.795864954, 43.072880832), z_dir=(0.9396926207859069, 0.3420201433256728, 0)), keep=Keep.TOP, mode=Mode.PRIVATE)
    with BuildSketch(Plane(origin=(35.050933619, 62.389032943, 54.20270371), x_dir=(0.9487414825566265, 0.3160531589404771, 0), z_dir=(0, 0, -1))) as chamfer2_piece_16b_section:
        Polygon((CHAMFER2_SIZE * 0.999621916911, -CHAMFER2_SIZE * 0.0274958766106), (-CHAMFER2_SIZE * 0.0274958766106, -CHAMFER2_SIZE * 0.999621916911), (0, 0), align=None)
    chamfer2_piece_16b = extrude(amount=17.85841494, mode=Mode.PRIVATE)
    chamfer2_piece_16b = split(chamfer2_piece_16b, bisect_by=Plane(origin=(35.307198251, 66.73901673, 47.77349624), z_dir=(0.3420201433256728, -0.9396926207859069, 0)), keep=Keep.TOP, mode=Mode.PRIVATE)
    chamfer2_piece_16b = split(chamfer2_piece_16b, bisect_by=Plane(origin=(36.163233847, 64.387078259, 41.34428877), z_dir=(0, 0, 1)), keep=Keep.TOP, mode=Mode.PRIVATE)
    chamfer2_piece_16 = chamfer2_piece_16a & chamfer2_piece_16b
    add(chamfer2_piece_16)


solid = part.part
